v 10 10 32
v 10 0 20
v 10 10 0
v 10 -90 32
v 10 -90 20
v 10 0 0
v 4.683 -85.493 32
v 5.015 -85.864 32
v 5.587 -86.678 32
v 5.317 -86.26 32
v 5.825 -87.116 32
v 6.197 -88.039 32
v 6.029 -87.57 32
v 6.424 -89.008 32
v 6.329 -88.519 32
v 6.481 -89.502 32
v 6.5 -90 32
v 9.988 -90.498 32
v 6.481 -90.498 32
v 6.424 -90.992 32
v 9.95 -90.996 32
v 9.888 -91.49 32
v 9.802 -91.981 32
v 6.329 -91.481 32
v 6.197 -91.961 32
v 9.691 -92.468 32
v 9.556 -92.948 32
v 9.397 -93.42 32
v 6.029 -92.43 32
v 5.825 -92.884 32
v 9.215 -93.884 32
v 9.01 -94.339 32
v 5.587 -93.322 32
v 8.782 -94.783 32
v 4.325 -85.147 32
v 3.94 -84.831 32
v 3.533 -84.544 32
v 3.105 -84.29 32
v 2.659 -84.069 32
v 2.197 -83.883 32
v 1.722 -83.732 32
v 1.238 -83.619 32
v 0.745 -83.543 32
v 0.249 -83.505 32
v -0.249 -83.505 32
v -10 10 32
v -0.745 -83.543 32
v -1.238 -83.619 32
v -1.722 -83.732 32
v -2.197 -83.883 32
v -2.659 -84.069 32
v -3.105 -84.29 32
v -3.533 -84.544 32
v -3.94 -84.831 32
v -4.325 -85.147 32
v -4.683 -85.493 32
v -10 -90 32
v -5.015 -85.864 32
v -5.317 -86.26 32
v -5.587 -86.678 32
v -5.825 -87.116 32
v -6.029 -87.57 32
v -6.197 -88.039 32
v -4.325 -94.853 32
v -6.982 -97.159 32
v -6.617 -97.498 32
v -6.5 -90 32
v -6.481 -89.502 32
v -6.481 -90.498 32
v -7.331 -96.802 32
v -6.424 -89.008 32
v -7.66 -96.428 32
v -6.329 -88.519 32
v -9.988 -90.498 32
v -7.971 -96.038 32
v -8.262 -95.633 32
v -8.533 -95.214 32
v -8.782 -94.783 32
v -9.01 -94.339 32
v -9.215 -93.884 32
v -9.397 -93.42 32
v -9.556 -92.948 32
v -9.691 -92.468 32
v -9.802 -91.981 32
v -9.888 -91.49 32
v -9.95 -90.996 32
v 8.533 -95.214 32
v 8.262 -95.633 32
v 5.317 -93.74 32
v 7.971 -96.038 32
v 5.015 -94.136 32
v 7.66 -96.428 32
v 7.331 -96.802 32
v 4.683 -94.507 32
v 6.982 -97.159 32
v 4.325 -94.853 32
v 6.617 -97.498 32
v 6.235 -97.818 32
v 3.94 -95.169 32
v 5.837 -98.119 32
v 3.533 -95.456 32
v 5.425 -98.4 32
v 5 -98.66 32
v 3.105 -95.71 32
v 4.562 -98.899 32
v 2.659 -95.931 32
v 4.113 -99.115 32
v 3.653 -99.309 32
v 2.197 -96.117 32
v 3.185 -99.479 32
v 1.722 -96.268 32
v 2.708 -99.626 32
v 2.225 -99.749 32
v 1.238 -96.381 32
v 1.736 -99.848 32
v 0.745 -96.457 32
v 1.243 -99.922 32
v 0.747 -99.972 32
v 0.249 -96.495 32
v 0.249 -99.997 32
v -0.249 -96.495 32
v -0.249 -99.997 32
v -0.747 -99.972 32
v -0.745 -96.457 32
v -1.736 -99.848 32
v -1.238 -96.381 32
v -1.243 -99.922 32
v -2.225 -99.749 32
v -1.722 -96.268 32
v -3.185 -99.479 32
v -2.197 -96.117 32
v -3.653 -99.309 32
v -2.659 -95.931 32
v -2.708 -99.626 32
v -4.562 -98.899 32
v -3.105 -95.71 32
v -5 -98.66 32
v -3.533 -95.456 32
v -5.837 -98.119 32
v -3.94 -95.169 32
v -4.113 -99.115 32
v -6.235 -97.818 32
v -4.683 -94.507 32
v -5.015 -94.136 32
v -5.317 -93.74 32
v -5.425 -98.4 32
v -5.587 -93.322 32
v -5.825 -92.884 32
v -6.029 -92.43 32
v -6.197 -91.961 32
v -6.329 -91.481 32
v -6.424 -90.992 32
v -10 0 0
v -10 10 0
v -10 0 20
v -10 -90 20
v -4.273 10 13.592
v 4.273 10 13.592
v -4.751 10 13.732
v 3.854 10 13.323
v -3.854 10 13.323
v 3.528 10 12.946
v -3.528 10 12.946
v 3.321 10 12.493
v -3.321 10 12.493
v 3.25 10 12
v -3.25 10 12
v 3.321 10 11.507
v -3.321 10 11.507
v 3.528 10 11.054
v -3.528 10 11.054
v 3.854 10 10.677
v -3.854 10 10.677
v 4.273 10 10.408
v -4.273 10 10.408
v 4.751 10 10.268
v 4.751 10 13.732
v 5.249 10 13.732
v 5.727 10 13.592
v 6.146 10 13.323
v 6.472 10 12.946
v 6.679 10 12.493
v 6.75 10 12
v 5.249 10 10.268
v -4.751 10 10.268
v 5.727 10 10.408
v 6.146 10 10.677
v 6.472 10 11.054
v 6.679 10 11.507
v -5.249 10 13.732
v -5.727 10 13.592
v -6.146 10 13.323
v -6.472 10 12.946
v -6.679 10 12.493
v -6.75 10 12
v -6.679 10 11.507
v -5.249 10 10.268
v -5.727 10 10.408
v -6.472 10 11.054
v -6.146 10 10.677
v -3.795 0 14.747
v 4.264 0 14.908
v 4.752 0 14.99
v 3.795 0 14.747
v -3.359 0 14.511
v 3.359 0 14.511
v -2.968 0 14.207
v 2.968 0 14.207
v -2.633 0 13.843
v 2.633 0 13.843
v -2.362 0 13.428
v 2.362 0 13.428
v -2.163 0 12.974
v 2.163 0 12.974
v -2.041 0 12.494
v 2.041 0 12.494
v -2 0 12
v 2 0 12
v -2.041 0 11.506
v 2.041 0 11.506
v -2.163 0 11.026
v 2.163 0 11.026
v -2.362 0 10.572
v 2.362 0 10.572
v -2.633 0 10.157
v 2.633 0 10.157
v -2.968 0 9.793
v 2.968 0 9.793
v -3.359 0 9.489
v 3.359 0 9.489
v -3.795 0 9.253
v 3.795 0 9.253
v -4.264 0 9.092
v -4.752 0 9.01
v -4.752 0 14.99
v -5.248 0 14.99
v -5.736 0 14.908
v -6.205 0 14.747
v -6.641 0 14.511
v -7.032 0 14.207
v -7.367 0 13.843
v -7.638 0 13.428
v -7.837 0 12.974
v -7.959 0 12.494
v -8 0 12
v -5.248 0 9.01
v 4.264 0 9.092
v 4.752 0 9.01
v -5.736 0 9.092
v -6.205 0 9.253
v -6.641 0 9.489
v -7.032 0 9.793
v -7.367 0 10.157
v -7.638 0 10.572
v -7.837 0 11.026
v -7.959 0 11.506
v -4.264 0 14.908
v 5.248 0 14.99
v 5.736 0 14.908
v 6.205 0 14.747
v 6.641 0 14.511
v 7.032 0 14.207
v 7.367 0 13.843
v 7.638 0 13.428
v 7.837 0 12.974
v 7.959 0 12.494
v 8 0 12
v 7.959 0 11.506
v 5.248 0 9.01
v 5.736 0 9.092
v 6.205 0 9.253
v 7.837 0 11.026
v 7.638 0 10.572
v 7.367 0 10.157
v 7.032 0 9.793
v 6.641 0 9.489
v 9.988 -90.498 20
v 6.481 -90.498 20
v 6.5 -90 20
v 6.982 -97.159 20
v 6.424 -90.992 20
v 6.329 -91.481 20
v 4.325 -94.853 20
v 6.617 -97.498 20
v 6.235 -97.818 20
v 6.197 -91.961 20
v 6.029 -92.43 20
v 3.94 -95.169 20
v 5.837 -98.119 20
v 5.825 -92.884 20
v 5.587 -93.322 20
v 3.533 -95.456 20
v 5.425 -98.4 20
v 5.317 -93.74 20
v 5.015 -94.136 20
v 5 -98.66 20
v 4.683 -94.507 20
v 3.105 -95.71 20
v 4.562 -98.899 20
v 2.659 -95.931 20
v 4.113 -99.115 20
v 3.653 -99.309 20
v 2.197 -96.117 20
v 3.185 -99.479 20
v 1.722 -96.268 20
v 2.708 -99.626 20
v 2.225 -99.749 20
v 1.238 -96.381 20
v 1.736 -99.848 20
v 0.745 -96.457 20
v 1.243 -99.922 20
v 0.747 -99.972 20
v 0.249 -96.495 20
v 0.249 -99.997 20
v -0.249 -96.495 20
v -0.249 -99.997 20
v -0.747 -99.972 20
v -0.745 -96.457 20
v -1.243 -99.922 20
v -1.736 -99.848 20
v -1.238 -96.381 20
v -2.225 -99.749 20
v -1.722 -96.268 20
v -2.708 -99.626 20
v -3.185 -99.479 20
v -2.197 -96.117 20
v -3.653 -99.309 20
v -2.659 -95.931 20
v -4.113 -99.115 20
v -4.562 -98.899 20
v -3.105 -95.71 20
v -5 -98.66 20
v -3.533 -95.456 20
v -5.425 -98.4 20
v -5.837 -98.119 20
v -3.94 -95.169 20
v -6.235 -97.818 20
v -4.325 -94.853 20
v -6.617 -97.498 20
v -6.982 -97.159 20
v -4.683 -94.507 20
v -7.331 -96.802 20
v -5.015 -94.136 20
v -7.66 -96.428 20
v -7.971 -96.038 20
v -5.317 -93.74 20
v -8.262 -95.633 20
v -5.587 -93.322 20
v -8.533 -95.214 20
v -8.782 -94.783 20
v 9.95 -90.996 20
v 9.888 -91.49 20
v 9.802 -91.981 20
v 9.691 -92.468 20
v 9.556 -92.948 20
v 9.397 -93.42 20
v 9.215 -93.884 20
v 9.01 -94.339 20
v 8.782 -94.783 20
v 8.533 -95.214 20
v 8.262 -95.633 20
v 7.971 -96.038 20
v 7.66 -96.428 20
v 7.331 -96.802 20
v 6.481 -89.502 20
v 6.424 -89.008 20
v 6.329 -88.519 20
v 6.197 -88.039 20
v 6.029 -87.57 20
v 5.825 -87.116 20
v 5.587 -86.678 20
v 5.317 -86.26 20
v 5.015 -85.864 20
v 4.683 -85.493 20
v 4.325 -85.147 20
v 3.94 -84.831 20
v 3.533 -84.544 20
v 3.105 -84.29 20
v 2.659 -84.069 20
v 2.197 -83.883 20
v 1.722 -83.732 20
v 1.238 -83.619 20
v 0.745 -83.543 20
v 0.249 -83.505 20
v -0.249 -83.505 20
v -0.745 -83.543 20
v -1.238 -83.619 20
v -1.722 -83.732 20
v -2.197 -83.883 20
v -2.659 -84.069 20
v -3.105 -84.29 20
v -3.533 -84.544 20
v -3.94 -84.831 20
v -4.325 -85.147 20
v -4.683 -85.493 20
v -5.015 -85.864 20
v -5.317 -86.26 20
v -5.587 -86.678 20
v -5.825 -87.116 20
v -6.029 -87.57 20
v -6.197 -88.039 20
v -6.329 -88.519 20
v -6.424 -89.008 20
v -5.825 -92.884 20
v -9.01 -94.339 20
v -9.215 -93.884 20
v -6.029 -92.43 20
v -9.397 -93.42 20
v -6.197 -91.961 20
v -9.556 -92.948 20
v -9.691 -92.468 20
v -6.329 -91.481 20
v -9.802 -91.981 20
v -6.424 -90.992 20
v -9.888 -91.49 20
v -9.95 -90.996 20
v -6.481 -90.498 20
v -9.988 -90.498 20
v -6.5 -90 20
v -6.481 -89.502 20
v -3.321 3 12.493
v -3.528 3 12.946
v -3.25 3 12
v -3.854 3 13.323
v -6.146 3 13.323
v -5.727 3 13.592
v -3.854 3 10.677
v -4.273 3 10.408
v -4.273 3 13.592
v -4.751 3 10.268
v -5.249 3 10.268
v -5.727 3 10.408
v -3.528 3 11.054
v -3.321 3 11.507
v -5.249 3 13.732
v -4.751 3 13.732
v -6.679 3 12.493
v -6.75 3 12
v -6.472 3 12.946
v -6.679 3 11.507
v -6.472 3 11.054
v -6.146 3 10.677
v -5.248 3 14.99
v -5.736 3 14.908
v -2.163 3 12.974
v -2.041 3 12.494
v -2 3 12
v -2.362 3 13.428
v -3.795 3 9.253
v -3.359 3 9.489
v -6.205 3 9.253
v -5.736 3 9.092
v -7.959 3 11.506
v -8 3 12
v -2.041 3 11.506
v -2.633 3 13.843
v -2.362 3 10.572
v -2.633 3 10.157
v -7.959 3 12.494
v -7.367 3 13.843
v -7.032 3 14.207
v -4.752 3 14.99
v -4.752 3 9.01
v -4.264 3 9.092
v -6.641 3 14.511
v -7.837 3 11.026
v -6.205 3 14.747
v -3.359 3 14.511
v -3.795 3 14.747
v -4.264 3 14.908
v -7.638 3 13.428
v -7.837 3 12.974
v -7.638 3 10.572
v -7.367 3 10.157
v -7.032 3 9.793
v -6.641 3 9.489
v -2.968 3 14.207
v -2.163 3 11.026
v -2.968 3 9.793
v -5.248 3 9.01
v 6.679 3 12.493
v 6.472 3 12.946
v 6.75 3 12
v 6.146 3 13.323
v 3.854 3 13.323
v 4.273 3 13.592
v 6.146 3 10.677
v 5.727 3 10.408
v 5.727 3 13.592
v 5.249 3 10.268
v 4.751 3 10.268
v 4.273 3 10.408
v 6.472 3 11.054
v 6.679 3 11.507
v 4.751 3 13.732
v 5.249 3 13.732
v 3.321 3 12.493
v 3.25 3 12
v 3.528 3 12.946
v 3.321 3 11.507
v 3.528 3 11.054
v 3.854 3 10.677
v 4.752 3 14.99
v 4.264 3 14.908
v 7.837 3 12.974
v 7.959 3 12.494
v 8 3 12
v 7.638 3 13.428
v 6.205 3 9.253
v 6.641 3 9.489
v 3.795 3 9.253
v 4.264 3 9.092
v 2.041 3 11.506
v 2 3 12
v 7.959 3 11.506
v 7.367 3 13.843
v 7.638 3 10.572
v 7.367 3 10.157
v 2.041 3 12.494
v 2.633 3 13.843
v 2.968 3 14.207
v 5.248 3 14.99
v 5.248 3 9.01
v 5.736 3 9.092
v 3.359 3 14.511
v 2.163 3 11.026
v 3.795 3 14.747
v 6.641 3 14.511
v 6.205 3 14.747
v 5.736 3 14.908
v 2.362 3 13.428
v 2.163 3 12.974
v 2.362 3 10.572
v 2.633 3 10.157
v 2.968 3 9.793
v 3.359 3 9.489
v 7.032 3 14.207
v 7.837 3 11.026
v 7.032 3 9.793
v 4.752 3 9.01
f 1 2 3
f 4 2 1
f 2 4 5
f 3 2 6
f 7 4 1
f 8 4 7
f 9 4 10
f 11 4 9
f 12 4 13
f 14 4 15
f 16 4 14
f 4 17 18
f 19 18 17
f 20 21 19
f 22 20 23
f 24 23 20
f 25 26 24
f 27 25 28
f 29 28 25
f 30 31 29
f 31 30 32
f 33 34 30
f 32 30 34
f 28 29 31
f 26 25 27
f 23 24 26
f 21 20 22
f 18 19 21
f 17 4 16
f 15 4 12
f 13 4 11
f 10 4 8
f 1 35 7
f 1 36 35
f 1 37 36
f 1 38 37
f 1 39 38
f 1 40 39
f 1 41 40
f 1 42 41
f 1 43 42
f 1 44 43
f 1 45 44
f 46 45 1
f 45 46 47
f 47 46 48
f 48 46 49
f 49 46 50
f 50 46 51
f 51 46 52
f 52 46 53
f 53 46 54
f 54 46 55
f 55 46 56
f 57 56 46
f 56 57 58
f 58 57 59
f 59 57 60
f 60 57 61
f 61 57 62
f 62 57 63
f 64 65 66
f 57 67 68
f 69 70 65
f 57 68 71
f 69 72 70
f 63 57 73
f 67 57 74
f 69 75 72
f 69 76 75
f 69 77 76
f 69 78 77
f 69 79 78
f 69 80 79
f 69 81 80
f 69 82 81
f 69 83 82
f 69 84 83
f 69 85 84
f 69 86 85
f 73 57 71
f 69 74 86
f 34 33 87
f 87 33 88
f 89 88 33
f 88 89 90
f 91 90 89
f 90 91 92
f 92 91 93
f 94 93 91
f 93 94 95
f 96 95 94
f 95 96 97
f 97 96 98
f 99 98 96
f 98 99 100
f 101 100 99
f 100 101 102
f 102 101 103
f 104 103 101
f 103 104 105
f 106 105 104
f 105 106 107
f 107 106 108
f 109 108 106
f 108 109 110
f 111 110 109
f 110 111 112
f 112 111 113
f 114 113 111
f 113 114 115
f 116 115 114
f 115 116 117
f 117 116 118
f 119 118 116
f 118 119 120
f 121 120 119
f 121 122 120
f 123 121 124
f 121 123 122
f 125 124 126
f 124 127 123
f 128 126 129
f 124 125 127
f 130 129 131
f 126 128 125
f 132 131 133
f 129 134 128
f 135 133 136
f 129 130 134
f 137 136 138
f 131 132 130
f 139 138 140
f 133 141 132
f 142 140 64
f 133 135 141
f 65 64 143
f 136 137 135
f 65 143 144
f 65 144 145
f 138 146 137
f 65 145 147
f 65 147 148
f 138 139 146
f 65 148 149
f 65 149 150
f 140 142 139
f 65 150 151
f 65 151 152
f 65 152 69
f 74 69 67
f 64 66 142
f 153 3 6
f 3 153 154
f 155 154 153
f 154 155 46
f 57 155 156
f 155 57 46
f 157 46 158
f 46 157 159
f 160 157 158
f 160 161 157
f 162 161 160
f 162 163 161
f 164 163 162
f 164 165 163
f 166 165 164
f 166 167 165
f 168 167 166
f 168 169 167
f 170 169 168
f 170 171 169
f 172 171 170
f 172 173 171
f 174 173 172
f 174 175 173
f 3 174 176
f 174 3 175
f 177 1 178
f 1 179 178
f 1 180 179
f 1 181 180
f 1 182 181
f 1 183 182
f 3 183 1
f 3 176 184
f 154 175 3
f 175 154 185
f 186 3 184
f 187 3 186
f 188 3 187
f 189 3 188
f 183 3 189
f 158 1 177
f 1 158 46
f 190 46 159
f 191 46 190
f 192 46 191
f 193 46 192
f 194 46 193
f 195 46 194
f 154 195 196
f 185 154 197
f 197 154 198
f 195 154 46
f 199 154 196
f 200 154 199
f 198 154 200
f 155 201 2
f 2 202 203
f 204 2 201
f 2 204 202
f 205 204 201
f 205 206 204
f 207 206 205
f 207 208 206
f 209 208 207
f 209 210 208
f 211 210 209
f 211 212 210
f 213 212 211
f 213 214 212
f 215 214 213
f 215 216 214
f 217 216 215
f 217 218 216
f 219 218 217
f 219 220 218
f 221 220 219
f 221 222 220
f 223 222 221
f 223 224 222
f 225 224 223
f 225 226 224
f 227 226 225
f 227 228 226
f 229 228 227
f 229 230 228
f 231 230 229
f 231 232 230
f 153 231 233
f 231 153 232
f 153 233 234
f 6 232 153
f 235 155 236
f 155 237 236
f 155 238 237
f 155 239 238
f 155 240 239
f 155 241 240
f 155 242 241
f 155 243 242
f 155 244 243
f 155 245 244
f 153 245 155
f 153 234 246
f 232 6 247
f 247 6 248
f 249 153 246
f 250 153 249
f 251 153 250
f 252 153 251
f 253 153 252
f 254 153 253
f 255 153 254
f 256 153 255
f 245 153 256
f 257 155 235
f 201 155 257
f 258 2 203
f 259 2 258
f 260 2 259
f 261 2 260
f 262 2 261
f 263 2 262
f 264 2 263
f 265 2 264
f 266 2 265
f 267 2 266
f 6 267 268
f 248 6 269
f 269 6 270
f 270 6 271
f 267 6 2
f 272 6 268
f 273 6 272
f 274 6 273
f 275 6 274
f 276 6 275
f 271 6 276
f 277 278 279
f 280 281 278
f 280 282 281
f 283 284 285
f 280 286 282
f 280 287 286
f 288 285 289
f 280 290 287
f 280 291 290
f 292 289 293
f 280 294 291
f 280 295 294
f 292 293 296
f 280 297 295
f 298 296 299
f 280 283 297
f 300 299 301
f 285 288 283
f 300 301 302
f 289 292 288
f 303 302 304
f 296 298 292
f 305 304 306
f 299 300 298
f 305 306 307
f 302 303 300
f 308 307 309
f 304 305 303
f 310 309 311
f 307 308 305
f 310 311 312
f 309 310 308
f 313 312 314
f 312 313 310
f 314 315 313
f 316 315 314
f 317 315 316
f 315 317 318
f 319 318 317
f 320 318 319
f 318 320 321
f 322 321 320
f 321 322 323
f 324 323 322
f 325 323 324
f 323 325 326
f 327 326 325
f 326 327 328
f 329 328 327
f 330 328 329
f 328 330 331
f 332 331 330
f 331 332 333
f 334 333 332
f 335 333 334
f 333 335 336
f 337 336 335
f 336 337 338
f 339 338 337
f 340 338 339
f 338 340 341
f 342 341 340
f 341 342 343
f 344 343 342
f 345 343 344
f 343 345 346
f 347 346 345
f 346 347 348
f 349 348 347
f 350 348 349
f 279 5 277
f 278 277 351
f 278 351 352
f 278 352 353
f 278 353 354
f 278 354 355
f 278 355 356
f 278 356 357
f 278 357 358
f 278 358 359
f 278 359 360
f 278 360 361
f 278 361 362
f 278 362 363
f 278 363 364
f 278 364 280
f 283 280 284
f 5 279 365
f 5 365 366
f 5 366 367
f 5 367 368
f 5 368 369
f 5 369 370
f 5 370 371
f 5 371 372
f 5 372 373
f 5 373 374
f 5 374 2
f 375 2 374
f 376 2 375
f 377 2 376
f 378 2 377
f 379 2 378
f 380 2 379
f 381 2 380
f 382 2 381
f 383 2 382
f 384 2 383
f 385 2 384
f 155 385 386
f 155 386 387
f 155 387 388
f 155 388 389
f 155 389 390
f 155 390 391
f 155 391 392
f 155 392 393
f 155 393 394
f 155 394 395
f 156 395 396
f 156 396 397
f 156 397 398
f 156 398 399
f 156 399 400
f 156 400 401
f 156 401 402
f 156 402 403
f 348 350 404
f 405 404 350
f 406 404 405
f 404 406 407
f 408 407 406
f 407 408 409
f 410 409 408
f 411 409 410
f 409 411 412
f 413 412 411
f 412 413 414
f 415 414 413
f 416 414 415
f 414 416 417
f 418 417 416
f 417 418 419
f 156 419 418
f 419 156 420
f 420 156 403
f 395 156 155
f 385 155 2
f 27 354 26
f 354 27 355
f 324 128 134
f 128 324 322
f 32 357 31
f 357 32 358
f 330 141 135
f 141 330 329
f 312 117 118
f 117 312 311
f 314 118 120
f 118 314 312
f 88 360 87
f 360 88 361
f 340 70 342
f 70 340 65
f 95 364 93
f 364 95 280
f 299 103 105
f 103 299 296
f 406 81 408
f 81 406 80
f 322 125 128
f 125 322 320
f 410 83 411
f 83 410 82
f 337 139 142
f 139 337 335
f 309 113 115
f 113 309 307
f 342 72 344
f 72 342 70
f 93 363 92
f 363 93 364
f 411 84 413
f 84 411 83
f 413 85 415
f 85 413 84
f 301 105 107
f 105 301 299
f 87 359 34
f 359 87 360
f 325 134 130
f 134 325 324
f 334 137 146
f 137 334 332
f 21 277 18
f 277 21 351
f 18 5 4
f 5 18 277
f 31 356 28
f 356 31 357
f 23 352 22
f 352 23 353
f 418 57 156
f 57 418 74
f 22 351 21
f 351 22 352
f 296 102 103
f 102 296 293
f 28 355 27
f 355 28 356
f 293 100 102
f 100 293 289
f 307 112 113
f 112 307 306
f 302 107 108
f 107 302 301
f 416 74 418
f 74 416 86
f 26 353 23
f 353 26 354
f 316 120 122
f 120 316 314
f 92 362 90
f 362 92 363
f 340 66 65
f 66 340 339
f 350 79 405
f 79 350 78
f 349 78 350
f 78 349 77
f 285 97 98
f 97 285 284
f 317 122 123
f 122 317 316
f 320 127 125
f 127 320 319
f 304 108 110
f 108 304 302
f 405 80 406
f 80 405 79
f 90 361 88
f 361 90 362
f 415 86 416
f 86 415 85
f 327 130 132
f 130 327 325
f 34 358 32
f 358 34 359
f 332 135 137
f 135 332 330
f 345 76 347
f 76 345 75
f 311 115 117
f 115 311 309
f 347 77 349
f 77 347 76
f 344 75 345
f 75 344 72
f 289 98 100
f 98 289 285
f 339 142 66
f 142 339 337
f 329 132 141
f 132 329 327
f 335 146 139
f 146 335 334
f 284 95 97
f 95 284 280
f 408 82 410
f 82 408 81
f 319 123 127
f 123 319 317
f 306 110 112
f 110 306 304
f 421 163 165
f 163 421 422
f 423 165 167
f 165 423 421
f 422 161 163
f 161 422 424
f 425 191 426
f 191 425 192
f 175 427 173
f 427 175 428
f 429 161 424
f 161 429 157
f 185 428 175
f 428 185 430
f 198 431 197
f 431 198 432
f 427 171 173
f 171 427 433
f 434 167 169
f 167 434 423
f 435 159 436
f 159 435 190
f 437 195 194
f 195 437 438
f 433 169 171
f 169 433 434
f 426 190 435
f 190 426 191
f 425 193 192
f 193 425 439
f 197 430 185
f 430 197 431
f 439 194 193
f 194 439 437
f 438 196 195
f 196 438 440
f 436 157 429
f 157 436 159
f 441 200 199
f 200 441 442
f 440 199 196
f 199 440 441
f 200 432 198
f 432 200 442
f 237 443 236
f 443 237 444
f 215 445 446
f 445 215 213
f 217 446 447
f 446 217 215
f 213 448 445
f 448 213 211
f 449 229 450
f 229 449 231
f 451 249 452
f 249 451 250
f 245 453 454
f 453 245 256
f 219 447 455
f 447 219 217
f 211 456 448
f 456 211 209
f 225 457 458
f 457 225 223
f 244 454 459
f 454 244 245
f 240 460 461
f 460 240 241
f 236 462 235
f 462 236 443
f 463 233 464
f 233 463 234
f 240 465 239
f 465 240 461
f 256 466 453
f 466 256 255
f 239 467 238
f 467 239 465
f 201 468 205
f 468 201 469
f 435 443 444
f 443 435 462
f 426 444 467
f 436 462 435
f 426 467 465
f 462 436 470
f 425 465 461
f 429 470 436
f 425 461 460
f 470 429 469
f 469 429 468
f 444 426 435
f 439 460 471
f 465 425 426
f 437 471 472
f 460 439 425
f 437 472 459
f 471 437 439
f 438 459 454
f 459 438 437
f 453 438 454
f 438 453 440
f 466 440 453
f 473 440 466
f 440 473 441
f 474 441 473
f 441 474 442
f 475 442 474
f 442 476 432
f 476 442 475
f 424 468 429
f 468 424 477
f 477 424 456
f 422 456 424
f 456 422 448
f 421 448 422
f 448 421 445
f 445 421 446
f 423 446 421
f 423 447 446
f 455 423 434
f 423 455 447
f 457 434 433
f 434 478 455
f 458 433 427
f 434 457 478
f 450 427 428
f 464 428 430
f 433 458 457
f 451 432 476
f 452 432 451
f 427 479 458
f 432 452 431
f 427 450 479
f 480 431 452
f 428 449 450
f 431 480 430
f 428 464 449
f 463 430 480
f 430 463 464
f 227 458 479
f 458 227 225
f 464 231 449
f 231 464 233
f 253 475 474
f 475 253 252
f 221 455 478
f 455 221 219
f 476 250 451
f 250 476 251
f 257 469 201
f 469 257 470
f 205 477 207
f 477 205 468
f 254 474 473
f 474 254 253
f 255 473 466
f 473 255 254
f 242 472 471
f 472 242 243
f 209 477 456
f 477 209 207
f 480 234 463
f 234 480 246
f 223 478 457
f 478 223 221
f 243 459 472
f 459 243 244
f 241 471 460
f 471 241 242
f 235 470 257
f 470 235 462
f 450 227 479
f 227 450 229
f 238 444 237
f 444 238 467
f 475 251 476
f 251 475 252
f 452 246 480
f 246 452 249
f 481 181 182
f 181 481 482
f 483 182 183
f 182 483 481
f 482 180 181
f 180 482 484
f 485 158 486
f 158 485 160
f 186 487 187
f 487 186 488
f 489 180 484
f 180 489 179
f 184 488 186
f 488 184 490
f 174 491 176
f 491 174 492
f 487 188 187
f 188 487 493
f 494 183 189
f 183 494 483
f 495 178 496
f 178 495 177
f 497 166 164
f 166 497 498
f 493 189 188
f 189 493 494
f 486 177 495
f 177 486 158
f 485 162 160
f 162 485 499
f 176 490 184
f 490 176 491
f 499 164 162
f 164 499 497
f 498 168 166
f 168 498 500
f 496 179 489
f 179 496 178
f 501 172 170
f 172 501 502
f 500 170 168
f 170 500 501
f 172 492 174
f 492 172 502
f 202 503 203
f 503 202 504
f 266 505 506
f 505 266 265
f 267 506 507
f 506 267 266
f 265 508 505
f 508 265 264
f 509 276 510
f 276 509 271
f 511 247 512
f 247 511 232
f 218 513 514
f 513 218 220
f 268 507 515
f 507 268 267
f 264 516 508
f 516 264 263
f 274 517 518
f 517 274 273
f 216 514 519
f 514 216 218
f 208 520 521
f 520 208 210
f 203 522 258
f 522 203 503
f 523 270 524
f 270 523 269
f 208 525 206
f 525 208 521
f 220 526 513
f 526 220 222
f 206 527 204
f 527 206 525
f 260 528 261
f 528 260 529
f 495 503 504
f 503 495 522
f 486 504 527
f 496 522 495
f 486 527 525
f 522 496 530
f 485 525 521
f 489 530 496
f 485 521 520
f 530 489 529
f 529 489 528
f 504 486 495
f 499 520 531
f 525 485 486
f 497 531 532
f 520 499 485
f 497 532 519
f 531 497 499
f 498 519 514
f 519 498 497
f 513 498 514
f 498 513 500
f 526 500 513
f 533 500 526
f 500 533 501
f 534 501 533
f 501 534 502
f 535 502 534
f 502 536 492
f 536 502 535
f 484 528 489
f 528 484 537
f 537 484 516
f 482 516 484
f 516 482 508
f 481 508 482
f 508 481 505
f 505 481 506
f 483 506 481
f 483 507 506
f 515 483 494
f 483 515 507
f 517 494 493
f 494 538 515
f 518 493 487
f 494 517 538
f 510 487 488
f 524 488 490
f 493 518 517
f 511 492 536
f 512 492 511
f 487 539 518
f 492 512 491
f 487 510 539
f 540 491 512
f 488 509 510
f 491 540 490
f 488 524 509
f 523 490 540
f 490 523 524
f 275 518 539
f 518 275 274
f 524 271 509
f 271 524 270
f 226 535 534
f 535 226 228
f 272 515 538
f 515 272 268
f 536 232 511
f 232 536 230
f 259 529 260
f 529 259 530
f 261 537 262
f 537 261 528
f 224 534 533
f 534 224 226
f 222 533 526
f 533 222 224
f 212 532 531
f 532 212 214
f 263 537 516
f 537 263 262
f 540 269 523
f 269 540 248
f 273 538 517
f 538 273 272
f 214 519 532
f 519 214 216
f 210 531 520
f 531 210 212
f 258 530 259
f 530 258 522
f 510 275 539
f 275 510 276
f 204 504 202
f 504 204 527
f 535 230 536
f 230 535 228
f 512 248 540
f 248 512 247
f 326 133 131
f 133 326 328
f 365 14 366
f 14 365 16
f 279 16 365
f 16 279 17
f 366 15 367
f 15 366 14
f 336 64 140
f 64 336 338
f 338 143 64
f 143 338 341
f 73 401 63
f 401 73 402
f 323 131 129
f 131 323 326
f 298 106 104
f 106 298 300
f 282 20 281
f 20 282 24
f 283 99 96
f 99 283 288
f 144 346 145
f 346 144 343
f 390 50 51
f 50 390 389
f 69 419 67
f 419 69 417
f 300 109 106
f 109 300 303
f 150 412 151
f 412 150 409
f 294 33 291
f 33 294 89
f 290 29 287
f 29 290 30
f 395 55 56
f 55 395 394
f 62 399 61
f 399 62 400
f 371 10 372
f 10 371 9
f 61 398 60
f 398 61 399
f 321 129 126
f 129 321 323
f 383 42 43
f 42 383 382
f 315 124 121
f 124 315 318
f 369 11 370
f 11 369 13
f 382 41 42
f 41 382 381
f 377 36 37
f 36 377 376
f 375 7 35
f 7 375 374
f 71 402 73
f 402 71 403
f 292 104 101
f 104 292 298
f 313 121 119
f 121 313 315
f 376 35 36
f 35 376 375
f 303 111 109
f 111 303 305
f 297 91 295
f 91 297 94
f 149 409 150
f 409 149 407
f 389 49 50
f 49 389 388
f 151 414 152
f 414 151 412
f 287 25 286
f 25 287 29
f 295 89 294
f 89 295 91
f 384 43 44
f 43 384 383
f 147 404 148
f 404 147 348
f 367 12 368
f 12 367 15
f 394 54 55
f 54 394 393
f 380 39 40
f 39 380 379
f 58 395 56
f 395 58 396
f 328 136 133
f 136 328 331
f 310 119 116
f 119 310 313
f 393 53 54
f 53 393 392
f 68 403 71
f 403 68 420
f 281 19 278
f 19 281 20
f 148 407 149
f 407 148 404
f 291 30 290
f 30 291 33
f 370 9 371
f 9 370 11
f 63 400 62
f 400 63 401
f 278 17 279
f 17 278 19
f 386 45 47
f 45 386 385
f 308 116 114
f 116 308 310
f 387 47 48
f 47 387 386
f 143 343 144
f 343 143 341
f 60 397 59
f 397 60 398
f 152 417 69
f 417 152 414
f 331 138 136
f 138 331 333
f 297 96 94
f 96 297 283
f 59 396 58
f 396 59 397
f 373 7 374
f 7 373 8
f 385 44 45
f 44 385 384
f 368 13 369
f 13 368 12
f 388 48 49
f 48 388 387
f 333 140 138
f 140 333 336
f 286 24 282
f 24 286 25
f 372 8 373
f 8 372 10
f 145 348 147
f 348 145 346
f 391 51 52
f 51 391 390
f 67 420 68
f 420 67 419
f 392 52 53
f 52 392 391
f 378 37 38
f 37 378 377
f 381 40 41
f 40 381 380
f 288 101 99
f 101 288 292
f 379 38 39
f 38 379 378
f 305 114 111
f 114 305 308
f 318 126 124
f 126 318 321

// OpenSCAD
module mount()
{
  $fs=0.5;
  $fa=2;
  difference()
  {
    translate([-20/2, 0, 0])
      union()
      {
        cube([20, 10, 20+12]);
        translate([0, -90, +20])
          cube([20, 90, 12]);
        translate([20/2, -90, 20])
          cylinder(r=20/2, h=12);
      }
    // screw holes
    for(dx=[-1, +1])
      translate([dx*5, 15, 12])
        rotate([90, 0, 0])
        {
          cylinder(r=3.5/2, h=20);
          translate([0, 0, 12])
            cylinder(r=6/2, h=10);
        }
    // end-hole holding
    translate([0, -90, 20-1])
      cylinder(r=13/2, h=12+2*1);
  }
}

mount();
